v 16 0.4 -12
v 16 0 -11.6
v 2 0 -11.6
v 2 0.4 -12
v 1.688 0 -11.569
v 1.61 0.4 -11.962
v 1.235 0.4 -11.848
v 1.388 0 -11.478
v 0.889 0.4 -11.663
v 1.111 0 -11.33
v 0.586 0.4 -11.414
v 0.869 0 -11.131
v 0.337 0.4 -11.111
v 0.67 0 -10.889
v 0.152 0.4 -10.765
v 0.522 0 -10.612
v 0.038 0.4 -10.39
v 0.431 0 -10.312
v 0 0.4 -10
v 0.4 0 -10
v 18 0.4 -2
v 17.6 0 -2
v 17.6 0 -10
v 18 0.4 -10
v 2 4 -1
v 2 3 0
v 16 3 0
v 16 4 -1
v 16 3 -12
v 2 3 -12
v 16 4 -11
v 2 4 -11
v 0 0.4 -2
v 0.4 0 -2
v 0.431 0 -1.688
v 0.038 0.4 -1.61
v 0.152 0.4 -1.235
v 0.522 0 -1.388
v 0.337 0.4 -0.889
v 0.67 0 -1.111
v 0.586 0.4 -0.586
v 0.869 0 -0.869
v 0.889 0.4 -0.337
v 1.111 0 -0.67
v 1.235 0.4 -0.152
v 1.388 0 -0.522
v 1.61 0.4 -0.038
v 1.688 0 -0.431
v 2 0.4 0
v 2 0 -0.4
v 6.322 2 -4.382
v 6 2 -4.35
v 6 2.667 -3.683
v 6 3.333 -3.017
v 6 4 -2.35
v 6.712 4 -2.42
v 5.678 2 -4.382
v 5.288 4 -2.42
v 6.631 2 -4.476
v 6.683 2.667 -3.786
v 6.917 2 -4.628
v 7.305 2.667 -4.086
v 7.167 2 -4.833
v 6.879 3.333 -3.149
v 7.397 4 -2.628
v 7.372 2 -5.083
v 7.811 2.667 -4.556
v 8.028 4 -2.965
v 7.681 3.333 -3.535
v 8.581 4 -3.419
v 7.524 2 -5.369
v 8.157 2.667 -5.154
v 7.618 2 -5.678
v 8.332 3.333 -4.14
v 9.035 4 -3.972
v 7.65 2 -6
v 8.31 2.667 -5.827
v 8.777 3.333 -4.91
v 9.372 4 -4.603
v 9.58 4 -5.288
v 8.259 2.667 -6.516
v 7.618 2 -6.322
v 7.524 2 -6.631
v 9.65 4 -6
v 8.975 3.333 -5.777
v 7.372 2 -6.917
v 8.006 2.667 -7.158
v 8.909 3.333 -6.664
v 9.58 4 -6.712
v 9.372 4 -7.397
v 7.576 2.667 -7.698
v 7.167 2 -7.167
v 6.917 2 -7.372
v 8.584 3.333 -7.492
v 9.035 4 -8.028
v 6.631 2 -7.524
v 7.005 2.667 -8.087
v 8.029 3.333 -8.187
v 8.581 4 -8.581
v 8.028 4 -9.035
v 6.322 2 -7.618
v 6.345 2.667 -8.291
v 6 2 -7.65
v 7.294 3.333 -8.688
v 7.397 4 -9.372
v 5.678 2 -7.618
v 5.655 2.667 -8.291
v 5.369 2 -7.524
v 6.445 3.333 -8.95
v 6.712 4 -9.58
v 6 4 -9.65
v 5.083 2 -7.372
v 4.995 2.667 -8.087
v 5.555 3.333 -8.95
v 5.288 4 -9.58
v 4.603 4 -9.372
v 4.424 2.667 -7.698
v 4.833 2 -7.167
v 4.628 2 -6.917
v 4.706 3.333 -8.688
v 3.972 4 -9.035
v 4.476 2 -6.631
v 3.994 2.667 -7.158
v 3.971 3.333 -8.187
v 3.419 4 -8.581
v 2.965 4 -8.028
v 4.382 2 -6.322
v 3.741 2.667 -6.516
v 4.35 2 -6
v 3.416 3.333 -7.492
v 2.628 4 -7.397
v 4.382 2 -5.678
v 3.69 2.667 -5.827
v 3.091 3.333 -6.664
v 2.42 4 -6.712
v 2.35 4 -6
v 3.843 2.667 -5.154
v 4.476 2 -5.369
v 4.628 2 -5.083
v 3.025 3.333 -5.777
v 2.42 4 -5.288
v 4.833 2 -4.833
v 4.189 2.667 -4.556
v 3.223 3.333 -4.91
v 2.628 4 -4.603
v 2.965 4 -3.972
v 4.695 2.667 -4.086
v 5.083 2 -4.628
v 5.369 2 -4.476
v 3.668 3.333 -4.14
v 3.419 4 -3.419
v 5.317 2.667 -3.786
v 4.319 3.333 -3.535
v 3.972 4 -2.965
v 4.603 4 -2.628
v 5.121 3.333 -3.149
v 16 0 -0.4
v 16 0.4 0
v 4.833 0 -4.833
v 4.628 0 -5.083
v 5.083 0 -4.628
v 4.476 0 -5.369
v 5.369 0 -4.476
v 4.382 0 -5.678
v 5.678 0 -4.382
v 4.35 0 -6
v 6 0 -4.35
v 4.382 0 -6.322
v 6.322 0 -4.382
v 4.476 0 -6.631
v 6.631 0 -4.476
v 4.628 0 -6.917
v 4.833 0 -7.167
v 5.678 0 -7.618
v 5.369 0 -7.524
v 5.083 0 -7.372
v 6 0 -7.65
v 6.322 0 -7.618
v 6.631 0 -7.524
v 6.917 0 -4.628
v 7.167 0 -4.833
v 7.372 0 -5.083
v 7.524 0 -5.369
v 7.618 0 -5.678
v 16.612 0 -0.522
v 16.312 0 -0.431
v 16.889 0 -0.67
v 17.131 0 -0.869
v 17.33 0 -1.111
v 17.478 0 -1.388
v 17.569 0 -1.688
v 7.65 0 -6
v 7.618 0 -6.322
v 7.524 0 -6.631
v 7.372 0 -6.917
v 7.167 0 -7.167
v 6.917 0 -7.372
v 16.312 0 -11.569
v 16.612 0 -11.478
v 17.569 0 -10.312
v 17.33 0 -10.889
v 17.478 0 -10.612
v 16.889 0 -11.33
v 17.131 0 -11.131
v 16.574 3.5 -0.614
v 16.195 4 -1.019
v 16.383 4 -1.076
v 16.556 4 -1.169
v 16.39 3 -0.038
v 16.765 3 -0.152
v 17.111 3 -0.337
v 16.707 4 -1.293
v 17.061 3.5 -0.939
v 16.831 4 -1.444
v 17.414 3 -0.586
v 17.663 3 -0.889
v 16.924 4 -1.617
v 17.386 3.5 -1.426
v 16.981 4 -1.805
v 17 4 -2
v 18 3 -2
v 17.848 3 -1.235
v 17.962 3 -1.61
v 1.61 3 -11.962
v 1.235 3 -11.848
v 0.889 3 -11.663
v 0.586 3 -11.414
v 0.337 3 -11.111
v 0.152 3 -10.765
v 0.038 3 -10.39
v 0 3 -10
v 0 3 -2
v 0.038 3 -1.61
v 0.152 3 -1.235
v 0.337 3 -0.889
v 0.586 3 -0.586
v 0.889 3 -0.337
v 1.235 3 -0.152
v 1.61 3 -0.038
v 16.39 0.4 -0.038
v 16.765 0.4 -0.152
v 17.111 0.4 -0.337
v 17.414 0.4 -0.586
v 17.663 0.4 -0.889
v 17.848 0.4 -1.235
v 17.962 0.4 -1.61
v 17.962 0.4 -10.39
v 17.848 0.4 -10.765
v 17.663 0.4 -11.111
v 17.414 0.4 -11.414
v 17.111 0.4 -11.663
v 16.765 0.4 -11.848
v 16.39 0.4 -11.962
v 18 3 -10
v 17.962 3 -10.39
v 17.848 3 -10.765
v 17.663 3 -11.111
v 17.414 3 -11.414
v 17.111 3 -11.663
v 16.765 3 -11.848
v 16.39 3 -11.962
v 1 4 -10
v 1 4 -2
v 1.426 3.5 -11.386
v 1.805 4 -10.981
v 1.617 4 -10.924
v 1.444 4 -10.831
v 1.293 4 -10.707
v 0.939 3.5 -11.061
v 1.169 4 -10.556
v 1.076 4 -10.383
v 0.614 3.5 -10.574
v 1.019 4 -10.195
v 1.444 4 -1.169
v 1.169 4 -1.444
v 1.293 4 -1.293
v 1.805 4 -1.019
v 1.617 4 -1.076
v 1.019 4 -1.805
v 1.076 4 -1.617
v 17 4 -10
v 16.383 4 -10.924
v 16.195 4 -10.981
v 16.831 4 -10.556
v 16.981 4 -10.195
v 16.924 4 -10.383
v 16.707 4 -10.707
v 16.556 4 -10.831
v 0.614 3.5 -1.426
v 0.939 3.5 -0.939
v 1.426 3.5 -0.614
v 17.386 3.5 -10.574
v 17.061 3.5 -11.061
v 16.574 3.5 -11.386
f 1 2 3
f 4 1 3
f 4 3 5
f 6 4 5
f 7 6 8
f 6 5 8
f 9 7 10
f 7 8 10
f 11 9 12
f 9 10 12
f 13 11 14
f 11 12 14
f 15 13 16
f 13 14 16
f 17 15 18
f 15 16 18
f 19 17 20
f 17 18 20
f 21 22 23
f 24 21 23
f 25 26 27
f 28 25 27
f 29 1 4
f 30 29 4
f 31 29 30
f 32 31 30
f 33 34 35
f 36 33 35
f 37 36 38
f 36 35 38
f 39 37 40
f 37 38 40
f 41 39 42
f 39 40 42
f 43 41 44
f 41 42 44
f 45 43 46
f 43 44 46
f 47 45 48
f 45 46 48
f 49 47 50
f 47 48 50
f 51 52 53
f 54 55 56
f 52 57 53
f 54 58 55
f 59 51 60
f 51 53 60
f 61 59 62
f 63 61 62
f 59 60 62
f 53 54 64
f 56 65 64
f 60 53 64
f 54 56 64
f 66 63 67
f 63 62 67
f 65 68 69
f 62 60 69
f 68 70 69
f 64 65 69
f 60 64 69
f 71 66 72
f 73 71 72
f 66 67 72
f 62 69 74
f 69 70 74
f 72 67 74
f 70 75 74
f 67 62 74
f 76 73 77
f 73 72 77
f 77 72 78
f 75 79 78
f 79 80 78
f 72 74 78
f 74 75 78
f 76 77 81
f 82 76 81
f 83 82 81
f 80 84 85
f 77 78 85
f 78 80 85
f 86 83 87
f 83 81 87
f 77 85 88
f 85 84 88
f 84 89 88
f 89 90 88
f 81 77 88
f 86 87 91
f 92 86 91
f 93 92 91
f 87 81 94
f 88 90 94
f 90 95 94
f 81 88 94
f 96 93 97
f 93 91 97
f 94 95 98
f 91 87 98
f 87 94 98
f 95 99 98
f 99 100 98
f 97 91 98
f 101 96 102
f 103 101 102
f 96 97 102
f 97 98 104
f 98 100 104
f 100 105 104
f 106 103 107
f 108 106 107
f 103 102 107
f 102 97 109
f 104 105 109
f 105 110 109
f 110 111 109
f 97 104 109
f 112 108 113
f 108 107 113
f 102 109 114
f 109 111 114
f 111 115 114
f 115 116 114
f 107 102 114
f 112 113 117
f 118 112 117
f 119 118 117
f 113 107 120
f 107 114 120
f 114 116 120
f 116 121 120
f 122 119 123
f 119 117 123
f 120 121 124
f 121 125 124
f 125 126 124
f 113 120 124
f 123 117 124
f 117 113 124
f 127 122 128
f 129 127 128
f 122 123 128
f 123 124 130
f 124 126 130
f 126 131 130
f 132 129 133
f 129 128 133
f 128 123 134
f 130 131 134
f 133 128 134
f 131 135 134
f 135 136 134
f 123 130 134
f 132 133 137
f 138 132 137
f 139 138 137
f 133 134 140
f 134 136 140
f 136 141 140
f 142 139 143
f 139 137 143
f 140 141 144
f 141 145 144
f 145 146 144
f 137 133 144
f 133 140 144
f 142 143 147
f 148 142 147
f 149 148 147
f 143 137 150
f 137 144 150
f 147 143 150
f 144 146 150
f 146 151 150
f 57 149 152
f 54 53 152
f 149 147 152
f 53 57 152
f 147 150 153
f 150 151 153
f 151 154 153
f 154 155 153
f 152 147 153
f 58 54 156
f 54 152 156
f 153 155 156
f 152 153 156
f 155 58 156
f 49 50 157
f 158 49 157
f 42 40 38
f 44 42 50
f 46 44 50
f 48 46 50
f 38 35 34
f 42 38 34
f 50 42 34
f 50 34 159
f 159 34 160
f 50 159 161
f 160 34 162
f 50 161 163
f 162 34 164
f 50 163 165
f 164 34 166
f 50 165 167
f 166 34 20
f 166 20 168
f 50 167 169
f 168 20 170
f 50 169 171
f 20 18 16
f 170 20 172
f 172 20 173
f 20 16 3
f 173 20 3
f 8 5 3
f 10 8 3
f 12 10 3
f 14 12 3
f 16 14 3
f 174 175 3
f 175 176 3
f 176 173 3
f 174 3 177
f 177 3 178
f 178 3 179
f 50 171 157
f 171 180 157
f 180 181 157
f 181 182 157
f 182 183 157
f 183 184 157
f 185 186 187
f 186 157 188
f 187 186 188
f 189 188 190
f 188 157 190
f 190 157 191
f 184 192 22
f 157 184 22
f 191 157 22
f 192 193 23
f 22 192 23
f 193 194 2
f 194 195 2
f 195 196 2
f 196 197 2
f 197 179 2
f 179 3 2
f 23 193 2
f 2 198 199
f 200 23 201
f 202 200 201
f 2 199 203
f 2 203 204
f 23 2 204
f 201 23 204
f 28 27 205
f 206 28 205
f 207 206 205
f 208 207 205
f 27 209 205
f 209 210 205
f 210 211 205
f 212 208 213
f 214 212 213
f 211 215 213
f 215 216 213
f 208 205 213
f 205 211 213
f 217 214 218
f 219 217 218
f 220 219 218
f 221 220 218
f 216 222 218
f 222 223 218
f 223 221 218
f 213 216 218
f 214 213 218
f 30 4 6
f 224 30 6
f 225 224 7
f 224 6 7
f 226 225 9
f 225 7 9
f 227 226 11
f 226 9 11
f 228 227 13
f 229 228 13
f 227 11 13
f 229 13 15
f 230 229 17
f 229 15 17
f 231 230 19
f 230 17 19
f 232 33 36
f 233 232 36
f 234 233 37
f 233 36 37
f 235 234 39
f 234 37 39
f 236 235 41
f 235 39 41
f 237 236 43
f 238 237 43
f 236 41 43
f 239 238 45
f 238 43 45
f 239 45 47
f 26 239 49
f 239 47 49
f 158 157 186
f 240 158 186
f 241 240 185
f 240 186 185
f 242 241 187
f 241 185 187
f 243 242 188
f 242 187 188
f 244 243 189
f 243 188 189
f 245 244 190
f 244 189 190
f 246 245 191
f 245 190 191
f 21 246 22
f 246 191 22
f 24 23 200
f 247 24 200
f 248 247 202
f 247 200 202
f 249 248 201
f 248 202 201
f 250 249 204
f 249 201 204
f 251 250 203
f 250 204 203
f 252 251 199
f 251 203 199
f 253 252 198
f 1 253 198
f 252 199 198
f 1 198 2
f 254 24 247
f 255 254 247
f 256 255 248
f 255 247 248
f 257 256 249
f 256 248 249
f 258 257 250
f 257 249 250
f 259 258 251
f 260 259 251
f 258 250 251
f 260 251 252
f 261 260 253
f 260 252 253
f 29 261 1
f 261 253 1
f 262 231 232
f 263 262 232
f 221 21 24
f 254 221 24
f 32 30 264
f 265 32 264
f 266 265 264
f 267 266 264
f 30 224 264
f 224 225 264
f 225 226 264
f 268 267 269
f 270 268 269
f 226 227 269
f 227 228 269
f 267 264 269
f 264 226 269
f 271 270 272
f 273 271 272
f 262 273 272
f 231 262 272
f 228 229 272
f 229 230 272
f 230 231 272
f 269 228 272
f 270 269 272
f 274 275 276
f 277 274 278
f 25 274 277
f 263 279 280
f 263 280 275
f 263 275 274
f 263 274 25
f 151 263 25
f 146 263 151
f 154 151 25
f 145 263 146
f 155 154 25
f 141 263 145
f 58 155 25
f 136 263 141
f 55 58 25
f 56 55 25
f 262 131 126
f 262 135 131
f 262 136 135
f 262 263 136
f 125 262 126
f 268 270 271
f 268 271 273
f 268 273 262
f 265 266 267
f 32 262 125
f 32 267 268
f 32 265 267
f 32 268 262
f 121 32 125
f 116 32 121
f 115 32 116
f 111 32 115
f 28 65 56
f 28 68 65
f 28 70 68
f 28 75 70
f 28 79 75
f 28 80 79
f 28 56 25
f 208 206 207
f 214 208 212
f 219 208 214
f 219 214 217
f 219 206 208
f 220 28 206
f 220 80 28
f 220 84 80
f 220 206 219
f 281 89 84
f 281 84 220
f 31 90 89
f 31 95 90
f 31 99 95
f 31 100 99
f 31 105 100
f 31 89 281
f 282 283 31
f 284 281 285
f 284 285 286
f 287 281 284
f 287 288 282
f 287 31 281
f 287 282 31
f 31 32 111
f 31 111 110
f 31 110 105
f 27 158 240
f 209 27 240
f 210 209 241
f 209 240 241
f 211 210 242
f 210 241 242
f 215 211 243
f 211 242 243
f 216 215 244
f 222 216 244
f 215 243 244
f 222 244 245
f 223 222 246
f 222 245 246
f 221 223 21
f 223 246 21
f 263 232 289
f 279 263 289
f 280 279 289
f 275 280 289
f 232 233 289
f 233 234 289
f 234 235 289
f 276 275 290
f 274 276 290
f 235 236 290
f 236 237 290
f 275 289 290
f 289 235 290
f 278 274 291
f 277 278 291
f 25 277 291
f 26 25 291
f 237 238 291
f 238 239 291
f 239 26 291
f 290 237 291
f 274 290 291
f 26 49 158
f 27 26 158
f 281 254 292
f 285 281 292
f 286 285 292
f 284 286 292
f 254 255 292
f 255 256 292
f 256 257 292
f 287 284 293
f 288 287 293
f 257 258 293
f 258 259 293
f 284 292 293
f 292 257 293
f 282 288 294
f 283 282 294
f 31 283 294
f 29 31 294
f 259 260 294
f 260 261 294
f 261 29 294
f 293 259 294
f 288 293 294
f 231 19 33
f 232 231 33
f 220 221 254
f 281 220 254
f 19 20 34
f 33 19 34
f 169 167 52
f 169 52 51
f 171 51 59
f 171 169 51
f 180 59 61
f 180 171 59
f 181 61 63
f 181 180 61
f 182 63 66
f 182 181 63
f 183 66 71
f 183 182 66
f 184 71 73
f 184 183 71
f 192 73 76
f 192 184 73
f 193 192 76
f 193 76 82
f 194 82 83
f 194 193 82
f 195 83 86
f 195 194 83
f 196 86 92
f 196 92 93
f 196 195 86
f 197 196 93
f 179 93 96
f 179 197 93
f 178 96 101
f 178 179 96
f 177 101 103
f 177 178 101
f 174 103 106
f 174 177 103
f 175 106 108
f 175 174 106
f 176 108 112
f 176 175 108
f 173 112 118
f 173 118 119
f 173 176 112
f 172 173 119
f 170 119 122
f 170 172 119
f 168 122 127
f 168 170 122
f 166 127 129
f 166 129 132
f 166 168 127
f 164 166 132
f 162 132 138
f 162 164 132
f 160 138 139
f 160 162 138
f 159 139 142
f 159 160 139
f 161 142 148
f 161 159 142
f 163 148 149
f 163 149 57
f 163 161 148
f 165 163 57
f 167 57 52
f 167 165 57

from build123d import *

# Parameters (mm, degrees)
SKETCH_1_R      = 1.65
EXTRUDE_1_DEPTH = 4
CHAMFER_1_SIZE  = 2
CHAMFER_2_SIZE  = 1
CHAMFER_3_SIZE  = 0.4


with BuildPart() as part:
    # 草图1 → 凸台-拉伸1 (new body)
    with BuildSketch(Plane(origin=(0, 0, 0), x_dir=(1, 0, 0), z_dir=(0, 1, 0))):
        with BuildLine():
            Line((2, 0), (16, 0))
            ThreePointArc((16, 0), (17.414213562, 0.585786438), (18, 2))
            Line((18, 2), (18, 10))
            ThreePointArc((18, 10), (17.414213562, 11.414213562), (16, 12))
            Line((16, 12), (2, 12))
            ThreePointArc((2, 12), (0.585786438, 11.414213562), (0, 10))
            Line((0, 10), (0, 2))
            ThreePointArc((0, 2), (0.585786438, 0.585786438), (2, 0))
        make_face()
        with Locations(Location((6, 6, 0), (0, 0, 270))):
            Circle(SKETCH_1_R, mode=Mode.SUBTRACT)
    extrude(amount=EXTRUDE_1_DEPTH)

    # 倒角1
    chamfer_1_edges = [part.edges().sort_by_distance(p)[0] for p in [
        (6, 4, -7.65),
    ]]
    chamfer(chamfer_1_edges, length=CHAMFER_1_SIZE)

    # 倒角2
    chamfer_2_edges = [part.edges().sort_by_distance(p)[0] for p in [
        (0.585786438, 4, -11.414213562),
        (0, 4, -6),
        (0.585786438, 4, -0.585786438),
        (9, 4, 0),
        (17.414213562, 4, -0.585786438),
        (18, 4, -6),
        (17.414213562, 4, -11.414213562),
        (9, 4, -12),
    ]]
    chamfer(chamfer_2_edges, length=CHAMFER_2_SIZE)

    # 倒角3
    chamfer_3_edges = [part.edges().sort_by_distance(p)[0] for p in [
        (0, 0, -6),
        (0.585786438, 0, -11.414213562),
        (9, 0, -12),
        (17.414213562, 0, -11.414213562),
        (18, 0, -6),
        (17.414213562, 0, -0.585786438),
        (9, 0, 0),
        (0.585786438, 0, -0.585786438),
    ]]
    chamfer(chamfer_3_edges, length=CHAMFER_3_SIZE)


solid = part.part
